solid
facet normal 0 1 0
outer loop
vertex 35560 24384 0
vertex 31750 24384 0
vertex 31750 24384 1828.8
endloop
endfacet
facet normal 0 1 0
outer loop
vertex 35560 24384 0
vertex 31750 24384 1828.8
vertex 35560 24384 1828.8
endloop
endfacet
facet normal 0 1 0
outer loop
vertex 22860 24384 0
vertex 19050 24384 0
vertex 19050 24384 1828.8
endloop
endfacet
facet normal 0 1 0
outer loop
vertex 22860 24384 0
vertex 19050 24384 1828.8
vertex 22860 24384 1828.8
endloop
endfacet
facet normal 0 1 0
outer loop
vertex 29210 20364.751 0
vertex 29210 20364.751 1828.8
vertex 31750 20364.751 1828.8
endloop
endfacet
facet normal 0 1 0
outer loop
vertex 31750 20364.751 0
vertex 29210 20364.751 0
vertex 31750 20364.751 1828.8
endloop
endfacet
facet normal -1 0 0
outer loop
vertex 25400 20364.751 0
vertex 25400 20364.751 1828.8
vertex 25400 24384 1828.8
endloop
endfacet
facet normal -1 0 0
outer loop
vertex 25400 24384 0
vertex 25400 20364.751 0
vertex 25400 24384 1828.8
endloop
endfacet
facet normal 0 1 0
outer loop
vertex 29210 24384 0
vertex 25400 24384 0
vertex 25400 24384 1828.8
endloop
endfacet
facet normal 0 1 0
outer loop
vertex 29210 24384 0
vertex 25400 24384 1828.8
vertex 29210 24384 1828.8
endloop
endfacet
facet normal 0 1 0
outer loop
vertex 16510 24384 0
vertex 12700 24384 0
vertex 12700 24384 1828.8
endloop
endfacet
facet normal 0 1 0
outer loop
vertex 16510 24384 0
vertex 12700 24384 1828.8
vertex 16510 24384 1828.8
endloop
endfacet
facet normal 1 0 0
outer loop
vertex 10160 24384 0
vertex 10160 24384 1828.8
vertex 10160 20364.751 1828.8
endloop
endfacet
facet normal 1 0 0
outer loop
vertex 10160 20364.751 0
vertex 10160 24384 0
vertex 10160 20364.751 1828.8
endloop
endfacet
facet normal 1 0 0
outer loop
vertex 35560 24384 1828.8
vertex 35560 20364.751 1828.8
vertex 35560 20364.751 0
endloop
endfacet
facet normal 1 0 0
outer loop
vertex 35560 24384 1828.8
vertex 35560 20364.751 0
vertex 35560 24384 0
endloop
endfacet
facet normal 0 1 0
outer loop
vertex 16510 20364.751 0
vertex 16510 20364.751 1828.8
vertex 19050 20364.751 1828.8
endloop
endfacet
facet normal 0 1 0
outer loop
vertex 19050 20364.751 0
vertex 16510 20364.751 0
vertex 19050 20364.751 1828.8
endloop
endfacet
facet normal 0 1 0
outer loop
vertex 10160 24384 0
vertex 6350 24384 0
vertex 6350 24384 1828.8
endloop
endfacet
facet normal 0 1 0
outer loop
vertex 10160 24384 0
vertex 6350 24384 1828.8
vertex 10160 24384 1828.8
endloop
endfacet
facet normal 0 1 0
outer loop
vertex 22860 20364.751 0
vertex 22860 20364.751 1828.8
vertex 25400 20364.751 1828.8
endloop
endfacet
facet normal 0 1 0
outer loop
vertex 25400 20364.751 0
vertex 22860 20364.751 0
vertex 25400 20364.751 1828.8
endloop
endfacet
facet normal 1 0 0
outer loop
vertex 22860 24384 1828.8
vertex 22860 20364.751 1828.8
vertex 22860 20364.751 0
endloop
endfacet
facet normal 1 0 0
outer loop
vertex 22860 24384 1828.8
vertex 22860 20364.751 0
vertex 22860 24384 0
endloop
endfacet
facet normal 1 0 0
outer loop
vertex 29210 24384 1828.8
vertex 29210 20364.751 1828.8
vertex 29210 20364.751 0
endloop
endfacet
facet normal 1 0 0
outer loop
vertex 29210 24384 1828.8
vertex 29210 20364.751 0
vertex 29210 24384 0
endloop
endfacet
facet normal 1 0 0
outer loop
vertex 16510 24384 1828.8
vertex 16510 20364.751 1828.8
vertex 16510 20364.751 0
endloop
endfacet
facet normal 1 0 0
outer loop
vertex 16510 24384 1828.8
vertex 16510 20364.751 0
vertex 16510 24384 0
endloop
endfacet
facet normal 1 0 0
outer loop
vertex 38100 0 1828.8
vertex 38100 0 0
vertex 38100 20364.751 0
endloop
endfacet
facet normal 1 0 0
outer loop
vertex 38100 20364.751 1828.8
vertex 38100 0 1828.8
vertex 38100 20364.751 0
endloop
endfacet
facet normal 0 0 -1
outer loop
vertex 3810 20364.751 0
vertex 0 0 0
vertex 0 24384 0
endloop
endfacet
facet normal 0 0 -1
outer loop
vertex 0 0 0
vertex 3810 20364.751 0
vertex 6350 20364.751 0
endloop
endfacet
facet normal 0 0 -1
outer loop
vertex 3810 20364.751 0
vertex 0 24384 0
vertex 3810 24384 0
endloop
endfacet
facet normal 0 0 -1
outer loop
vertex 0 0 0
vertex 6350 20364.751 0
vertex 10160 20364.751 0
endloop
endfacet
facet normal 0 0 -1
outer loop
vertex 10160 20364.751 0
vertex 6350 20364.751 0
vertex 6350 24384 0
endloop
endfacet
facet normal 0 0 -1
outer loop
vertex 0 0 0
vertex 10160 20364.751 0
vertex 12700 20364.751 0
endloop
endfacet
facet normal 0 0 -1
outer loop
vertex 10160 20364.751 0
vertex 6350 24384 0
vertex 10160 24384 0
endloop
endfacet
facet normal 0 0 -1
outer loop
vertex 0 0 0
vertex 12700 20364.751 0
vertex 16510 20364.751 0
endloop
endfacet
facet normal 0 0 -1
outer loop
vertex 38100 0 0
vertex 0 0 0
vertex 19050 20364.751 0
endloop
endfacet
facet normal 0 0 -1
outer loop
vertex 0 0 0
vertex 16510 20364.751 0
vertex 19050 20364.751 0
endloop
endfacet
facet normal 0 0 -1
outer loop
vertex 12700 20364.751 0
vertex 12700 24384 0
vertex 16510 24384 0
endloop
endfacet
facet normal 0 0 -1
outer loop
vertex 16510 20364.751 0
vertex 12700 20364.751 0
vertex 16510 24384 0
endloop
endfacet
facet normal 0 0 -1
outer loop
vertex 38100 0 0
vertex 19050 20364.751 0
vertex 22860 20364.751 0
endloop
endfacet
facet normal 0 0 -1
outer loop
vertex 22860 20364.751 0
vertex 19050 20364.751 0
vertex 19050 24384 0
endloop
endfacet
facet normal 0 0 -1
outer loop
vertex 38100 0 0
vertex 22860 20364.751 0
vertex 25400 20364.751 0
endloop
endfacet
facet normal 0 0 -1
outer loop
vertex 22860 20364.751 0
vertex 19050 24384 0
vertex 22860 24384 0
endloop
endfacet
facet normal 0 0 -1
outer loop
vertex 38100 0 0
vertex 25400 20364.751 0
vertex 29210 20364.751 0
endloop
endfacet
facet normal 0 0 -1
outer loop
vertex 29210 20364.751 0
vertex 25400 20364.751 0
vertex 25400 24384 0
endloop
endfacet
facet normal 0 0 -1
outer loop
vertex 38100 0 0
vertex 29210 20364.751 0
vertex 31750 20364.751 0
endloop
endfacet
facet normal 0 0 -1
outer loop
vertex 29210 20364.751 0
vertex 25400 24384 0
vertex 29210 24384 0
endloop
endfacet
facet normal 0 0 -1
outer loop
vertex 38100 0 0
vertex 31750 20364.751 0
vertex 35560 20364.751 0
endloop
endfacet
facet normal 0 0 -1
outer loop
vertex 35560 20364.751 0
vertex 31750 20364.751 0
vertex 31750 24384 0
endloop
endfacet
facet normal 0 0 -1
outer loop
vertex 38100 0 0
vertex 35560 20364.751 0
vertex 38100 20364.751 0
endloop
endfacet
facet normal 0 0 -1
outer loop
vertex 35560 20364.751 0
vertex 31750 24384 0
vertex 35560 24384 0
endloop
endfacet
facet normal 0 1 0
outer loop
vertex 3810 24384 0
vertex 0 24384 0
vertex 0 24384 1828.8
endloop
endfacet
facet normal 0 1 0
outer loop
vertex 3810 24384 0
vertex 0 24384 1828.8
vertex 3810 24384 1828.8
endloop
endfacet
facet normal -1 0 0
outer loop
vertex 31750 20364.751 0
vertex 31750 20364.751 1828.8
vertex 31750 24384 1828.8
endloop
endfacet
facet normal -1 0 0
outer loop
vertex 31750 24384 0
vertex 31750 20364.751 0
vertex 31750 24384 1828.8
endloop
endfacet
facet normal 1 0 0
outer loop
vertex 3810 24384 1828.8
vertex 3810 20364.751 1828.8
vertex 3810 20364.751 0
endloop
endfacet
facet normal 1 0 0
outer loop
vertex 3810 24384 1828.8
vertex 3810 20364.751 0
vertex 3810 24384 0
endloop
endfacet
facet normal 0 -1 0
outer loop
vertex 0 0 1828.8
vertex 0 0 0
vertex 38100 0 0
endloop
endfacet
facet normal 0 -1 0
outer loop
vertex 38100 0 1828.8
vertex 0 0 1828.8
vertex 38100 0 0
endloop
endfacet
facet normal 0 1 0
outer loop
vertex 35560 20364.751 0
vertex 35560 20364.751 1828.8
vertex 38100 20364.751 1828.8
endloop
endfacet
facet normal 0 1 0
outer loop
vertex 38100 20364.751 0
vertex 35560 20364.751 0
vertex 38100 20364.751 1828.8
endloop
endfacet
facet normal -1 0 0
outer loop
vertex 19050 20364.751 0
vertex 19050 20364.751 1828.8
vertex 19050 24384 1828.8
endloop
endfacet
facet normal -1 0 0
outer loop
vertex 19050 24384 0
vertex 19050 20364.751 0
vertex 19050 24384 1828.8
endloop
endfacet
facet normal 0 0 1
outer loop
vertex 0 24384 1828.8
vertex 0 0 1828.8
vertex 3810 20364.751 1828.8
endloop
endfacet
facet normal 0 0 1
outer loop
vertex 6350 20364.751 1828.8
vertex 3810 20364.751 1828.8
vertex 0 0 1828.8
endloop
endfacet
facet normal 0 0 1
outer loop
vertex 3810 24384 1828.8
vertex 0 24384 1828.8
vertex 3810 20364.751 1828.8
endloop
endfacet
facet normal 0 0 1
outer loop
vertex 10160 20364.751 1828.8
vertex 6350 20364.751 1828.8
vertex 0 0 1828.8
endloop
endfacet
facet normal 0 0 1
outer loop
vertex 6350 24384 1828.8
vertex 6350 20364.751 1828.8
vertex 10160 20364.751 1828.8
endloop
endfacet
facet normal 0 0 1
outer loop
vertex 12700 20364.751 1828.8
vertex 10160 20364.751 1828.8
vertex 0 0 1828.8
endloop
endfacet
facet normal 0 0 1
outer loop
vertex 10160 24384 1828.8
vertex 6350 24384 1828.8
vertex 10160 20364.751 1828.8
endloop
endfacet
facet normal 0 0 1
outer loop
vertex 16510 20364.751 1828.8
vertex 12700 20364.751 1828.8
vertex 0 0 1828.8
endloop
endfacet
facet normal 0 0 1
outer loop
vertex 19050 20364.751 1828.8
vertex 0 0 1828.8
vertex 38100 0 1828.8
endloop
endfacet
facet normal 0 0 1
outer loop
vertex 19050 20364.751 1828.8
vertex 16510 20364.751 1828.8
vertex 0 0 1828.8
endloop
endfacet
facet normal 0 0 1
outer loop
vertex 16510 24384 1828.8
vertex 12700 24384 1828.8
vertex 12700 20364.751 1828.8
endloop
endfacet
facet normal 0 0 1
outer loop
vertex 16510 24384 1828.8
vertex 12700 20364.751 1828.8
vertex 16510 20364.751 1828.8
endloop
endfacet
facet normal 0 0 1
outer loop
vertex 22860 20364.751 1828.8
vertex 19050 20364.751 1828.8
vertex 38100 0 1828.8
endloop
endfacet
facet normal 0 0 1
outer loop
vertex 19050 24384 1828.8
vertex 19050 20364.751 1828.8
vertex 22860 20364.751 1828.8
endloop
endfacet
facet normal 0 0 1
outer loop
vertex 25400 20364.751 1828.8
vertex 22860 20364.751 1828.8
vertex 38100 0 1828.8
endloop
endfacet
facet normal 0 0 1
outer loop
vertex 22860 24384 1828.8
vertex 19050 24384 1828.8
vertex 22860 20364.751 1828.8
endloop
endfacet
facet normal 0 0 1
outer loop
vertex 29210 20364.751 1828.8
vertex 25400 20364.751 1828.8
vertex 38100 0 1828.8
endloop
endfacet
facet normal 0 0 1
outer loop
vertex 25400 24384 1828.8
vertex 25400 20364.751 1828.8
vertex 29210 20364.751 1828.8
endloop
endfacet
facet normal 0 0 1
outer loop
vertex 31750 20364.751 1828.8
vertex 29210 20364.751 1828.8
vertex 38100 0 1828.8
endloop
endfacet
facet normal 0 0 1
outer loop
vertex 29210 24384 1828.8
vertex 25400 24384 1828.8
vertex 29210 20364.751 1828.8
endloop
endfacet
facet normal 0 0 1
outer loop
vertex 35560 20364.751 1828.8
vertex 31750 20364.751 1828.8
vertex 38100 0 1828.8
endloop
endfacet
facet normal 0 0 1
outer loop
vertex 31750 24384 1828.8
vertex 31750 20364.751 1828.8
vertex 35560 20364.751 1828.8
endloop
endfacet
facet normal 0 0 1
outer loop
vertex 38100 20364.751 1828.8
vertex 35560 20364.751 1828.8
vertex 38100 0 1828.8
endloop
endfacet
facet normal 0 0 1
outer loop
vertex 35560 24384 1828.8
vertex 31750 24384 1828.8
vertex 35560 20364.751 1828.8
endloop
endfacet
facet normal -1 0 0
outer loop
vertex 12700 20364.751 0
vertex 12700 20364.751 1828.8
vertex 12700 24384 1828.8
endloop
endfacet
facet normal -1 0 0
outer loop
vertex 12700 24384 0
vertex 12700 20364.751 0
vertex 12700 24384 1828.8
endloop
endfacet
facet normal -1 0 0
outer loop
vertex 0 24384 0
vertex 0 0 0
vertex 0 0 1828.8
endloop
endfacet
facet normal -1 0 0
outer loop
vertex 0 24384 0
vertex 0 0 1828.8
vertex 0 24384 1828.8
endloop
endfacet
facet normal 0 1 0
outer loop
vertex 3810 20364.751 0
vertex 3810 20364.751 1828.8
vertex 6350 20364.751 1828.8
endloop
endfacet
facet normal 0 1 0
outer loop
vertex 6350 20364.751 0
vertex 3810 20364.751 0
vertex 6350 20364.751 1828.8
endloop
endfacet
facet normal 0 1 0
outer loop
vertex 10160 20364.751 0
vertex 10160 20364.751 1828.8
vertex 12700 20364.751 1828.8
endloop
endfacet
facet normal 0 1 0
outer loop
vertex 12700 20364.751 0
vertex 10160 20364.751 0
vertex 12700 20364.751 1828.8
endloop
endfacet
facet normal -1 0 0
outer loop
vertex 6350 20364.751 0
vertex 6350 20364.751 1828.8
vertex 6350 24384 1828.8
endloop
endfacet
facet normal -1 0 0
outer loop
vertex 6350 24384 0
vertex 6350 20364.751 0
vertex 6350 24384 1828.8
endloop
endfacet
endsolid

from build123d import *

# Parameters (mm, degrees)
SKETCH1_W           = 38100
SKETCH1_H           = 24384
BOSS_EXTRUDE1_DEPTH = 1828.8
SKETCH2_W           = 2540
SKETCH2_H           = 4019.249447419
CUT_EXTRUDE2_DEPTH  = 1828.8


with BuildPart() as part:
    # Sketch1 → Boss-Extrude1 (new body)
    with BuildSketch(Plane.XY):
        with Locations((19050, 12192)):
            Rectangle(SKETCH1_W, SKETCH1_H)
    extrude(amount=BOSS_EXTRUDE1_DEPTH)

    # Sketch2 → Cut-Extrude2 (cut)
    with BuildSketch(Plane.XY.offset(1828.8)):
        with Locations((5080, 22374.37527629)):
            Rectangle(SKETCH2_W, SKETCH2_H)
        Polygon((11430, 24384), (10160, 24384), (10160, 20364.750552581), (12700, 20364.750552581), (12700, 24384), align=None)
        with Locations((17780, 22374.37527629)):
            Rectangle(SKETCH2_W, SKETCH2_H)
        with Locations((24130, 22374.37527629)):
            Rectangle(SKETCH2_W, SKETCH2_H)
        with Locations((30480, 22374.37527629)):
            Rectangle(SKETCH2_W, SKETCH2_H)
        with Locations((36830, 22374.37527629)):
            Rectangle(SKETCH2_W, SKETCH2_H)
    extrude(amount=-CUT_EXTRUDE2_DEPTH, mode=Mode.SUBTRACT)


solid = part.part
